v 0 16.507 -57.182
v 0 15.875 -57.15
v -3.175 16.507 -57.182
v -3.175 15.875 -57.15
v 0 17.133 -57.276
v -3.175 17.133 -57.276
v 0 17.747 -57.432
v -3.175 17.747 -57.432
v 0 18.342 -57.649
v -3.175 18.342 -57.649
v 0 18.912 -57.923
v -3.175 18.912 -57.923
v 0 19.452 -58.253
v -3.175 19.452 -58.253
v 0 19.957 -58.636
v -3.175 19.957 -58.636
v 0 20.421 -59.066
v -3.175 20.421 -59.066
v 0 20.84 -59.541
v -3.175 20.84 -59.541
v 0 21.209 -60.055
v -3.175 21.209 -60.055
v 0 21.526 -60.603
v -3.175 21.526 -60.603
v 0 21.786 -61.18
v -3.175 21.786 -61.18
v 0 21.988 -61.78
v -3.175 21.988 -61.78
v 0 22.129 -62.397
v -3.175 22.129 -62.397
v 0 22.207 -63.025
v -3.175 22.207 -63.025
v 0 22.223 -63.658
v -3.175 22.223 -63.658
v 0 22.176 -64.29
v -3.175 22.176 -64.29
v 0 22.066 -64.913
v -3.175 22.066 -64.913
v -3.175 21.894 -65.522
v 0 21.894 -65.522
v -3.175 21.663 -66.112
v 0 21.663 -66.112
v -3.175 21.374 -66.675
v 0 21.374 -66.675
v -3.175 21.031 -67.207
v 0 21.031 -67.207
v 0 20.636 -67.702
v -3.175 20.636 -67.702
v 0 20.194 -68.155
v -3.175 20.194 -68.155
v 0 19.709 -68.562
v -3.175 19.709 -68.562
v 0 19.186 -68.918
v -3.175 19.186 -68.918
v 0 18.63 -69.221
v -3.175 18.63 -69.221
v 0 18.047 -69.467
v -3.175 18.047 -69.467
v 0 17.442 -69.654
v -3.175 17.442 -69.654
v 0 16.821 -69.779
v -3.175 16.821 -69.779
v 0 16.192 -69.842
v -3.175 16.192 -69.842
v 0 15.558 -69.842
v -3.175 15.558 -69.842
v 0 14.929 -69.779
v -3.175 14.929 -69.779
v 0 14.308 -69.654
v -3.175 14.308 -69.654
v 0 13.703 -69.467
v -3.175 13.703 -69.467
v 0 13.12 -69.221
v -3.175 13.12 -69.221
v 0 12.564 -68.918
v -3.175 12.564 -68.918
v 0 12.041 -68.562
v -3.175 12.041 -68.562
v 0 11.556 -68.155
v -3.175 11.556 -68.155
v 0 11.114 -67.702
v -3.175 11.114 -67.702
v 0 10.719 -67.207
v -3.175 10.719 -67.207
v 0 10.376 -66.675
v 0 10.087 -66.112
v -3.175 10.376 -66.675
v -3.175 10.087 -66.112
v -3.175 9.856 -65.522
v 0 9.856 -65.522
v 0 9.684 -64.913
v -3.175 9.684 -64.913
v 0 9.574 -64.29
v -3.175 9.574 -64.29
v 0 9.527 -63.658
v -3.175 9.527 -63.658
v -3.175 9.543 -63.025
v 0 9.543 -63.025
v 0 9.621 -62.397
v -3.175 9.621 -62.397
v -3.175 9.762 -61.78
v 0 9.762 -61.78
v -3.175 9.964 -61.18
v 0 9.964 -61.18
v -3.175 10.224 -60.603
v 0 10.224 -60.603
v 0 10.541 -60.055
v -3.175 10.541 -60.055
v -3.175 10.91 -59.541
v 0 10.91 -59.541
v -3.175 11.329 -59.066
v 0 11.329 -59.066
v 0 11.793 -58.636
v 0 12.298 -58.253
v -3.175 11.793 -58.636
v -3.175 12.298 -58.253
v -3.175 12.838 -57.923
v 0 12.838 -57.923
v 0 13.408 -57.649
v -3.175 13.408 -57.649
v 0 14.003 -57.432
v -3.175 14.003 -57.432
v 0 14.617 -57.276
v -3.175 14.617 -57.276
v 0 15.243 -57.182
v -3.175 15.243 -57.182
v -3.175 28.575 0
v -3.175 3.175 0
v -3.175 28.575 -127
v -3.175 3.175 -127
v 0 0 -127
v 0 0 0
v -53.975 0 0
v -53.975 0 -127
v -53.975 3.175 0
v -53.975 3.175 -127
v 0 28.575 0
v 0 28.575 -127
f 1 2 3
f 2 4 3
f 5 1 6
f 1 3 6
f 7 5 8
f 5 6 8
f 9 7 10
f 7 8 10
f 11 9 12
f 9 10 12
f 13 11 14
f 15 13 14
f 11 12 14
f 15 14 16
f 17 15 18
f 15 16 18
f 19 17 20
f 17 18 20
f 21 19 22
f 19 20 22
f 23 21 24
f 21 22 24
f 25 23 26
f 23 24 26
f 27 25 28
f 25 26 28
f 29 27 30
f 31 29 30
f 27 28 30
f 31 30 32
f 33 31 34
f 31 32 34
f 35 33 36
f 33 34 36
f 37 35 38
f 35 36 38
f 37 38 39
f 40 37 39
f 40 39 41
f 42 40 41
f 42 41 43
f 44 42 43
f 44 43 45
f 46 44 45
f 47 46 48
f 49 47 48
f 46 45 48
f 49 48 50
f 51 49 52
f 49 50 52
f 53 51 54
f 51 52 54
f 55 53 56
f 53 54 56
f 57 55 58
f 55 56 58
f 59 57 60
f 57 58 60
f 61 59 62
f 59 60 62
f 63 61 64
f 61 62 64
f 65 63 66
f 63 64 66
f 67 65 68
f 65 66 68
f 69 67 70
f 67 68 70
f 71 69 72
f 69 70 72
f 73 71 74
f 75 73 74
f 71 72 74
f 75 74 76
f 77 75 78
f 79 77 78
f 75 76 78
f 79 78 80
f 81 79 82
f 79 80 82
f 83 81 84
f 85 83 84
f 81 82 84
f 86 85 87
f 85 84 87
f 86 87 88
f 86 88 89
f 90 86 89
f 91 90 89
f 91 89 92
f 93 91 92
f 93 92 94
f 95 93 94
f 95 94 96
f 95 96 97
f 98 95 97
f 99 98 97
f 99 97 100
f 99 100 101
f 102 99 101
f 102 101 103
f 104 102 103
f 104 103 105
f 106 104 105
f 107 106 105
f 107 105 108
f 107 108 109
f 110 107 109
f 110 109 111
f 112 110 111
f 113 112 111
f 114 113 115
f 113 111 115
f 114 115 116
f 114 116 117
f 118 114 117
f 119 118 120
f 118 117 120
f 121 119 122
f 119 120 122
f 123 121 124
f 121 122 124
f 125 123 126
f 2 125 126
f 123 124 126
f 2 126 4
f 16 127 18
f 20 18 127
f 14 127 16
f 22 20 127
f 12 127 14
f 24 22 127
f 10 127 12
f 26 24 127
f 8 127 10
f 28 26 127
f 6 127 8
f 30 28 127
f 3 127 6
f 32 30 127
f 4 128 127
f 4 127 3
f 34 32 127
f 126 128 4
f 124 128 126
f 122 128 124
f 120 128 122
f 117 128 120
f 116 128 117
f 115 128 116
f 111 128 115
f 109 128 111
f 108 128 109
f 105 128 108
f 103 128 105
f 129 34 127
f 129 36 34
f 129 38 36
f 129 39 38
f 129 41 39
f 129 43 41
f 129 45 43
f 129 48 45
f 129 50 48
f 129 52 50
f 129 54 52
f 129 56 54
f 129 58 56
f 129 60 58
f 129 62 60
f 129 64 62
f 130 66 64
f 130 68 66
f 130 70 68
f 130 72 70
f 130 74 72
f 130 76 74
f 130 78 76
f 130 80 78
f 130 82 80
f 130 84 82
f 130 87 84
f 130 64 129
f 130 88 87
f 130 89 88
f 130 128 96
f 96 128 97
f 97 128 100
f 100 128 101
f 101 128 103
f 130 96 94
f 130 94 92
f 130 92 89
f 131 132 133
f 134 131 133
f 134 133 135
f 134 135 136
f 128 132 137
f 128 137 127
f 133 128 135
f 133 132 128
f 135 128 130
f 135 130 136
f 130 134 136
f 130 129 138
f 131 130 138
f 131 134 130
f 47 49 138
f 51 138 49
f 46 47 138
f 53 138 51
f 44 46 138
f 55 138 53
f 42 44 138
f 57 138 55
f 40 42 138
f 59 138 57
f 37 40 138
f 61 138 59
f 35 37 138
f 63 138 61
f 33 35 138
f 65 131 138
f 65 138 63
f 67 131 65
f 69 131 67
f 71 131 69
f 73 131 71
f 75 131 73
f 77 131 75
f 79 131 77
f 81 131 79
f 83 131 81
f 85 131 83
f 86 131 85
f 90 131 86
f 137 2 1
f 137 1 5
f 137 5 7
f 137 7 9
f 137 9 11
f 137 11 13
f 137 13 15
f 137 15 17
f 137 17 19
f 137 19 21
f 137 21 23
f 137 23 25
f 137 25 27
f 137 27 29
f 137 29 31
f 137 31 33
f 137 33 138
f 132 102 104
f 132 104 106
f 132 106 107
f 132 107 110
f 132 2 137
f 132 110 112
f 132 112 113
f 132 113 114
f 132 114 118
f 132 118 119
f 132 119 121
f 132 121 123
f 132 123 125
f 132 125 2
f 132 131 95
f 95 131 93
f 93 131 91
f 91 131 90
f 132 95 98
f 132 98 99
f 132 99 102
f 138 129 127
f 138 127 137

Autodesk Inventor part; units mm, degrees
ref_plane "YZ Plane" through (0, 0, 0) normal (1, 0, 0) x (0, 1, 0)
ref_plane "XZ Plane" through (0, 0, 0) normal (0, 1, 0) x (-1, 0, 0)
ref_plane "XY Plane" through (0, 0, 0) normal (0, 0, 1) x (1, 0, 0)
sketch "Sketch1" plane through (0, 0, 0) normal (0, 1, 0) x (-1, 0, 0)
  line L0 (0, 0) -> (53.975, 0)
  line L1 (53.975, 0) -> (53.975, -127)
  line L2 (53.975, -127) -> (0, -127)
  line L3 (0, -127) -> (0, 0)
  dimension "d0" = 53.975
  dimension "d1" = 127
extrude "Extrusion1" add sketch "Sketch1" along normal blind 3.175
sketch "Sketch2" plane through (0, 3.175, 0) normal (0, 1, 0) x (1, 0, 0)
  line L0 (0, 127) -> (-53.975, 127) projected
  line L1 (0, 0) -> (-3.175, 0)
  line L2 (-3.175, 0) -> (-3.175, 127)
  line L3 (-3.175, 127) -> (0, 127)
  line L4 (0, 127) -> (0, 0)
  dimension "d4" = 3.175
extrude "Extrusion2" add sketch "Sketch2" along normal blind 25.4
sketch "Sketch3" plane through (-3.175, 3.175, -127) normal (-1, 0, 0) x (0, 0, 1)
  circle A0 centre (63.5, 12.7) radius 6.35
  line L0 (0, 25.4) -> (127, 25.4) projected
  line L1 (0, 0) -> (0, 25.4) projected
  point P0 (127, -3.175)
  dimension "d7" = 12.7
  dimension "d8" = 12.7
  dimension "d9" = 63.5
extrude "Extrusion3" cut sketch "Sketch3" against normal blind 3.175
properties part number "First Pivot Point"
